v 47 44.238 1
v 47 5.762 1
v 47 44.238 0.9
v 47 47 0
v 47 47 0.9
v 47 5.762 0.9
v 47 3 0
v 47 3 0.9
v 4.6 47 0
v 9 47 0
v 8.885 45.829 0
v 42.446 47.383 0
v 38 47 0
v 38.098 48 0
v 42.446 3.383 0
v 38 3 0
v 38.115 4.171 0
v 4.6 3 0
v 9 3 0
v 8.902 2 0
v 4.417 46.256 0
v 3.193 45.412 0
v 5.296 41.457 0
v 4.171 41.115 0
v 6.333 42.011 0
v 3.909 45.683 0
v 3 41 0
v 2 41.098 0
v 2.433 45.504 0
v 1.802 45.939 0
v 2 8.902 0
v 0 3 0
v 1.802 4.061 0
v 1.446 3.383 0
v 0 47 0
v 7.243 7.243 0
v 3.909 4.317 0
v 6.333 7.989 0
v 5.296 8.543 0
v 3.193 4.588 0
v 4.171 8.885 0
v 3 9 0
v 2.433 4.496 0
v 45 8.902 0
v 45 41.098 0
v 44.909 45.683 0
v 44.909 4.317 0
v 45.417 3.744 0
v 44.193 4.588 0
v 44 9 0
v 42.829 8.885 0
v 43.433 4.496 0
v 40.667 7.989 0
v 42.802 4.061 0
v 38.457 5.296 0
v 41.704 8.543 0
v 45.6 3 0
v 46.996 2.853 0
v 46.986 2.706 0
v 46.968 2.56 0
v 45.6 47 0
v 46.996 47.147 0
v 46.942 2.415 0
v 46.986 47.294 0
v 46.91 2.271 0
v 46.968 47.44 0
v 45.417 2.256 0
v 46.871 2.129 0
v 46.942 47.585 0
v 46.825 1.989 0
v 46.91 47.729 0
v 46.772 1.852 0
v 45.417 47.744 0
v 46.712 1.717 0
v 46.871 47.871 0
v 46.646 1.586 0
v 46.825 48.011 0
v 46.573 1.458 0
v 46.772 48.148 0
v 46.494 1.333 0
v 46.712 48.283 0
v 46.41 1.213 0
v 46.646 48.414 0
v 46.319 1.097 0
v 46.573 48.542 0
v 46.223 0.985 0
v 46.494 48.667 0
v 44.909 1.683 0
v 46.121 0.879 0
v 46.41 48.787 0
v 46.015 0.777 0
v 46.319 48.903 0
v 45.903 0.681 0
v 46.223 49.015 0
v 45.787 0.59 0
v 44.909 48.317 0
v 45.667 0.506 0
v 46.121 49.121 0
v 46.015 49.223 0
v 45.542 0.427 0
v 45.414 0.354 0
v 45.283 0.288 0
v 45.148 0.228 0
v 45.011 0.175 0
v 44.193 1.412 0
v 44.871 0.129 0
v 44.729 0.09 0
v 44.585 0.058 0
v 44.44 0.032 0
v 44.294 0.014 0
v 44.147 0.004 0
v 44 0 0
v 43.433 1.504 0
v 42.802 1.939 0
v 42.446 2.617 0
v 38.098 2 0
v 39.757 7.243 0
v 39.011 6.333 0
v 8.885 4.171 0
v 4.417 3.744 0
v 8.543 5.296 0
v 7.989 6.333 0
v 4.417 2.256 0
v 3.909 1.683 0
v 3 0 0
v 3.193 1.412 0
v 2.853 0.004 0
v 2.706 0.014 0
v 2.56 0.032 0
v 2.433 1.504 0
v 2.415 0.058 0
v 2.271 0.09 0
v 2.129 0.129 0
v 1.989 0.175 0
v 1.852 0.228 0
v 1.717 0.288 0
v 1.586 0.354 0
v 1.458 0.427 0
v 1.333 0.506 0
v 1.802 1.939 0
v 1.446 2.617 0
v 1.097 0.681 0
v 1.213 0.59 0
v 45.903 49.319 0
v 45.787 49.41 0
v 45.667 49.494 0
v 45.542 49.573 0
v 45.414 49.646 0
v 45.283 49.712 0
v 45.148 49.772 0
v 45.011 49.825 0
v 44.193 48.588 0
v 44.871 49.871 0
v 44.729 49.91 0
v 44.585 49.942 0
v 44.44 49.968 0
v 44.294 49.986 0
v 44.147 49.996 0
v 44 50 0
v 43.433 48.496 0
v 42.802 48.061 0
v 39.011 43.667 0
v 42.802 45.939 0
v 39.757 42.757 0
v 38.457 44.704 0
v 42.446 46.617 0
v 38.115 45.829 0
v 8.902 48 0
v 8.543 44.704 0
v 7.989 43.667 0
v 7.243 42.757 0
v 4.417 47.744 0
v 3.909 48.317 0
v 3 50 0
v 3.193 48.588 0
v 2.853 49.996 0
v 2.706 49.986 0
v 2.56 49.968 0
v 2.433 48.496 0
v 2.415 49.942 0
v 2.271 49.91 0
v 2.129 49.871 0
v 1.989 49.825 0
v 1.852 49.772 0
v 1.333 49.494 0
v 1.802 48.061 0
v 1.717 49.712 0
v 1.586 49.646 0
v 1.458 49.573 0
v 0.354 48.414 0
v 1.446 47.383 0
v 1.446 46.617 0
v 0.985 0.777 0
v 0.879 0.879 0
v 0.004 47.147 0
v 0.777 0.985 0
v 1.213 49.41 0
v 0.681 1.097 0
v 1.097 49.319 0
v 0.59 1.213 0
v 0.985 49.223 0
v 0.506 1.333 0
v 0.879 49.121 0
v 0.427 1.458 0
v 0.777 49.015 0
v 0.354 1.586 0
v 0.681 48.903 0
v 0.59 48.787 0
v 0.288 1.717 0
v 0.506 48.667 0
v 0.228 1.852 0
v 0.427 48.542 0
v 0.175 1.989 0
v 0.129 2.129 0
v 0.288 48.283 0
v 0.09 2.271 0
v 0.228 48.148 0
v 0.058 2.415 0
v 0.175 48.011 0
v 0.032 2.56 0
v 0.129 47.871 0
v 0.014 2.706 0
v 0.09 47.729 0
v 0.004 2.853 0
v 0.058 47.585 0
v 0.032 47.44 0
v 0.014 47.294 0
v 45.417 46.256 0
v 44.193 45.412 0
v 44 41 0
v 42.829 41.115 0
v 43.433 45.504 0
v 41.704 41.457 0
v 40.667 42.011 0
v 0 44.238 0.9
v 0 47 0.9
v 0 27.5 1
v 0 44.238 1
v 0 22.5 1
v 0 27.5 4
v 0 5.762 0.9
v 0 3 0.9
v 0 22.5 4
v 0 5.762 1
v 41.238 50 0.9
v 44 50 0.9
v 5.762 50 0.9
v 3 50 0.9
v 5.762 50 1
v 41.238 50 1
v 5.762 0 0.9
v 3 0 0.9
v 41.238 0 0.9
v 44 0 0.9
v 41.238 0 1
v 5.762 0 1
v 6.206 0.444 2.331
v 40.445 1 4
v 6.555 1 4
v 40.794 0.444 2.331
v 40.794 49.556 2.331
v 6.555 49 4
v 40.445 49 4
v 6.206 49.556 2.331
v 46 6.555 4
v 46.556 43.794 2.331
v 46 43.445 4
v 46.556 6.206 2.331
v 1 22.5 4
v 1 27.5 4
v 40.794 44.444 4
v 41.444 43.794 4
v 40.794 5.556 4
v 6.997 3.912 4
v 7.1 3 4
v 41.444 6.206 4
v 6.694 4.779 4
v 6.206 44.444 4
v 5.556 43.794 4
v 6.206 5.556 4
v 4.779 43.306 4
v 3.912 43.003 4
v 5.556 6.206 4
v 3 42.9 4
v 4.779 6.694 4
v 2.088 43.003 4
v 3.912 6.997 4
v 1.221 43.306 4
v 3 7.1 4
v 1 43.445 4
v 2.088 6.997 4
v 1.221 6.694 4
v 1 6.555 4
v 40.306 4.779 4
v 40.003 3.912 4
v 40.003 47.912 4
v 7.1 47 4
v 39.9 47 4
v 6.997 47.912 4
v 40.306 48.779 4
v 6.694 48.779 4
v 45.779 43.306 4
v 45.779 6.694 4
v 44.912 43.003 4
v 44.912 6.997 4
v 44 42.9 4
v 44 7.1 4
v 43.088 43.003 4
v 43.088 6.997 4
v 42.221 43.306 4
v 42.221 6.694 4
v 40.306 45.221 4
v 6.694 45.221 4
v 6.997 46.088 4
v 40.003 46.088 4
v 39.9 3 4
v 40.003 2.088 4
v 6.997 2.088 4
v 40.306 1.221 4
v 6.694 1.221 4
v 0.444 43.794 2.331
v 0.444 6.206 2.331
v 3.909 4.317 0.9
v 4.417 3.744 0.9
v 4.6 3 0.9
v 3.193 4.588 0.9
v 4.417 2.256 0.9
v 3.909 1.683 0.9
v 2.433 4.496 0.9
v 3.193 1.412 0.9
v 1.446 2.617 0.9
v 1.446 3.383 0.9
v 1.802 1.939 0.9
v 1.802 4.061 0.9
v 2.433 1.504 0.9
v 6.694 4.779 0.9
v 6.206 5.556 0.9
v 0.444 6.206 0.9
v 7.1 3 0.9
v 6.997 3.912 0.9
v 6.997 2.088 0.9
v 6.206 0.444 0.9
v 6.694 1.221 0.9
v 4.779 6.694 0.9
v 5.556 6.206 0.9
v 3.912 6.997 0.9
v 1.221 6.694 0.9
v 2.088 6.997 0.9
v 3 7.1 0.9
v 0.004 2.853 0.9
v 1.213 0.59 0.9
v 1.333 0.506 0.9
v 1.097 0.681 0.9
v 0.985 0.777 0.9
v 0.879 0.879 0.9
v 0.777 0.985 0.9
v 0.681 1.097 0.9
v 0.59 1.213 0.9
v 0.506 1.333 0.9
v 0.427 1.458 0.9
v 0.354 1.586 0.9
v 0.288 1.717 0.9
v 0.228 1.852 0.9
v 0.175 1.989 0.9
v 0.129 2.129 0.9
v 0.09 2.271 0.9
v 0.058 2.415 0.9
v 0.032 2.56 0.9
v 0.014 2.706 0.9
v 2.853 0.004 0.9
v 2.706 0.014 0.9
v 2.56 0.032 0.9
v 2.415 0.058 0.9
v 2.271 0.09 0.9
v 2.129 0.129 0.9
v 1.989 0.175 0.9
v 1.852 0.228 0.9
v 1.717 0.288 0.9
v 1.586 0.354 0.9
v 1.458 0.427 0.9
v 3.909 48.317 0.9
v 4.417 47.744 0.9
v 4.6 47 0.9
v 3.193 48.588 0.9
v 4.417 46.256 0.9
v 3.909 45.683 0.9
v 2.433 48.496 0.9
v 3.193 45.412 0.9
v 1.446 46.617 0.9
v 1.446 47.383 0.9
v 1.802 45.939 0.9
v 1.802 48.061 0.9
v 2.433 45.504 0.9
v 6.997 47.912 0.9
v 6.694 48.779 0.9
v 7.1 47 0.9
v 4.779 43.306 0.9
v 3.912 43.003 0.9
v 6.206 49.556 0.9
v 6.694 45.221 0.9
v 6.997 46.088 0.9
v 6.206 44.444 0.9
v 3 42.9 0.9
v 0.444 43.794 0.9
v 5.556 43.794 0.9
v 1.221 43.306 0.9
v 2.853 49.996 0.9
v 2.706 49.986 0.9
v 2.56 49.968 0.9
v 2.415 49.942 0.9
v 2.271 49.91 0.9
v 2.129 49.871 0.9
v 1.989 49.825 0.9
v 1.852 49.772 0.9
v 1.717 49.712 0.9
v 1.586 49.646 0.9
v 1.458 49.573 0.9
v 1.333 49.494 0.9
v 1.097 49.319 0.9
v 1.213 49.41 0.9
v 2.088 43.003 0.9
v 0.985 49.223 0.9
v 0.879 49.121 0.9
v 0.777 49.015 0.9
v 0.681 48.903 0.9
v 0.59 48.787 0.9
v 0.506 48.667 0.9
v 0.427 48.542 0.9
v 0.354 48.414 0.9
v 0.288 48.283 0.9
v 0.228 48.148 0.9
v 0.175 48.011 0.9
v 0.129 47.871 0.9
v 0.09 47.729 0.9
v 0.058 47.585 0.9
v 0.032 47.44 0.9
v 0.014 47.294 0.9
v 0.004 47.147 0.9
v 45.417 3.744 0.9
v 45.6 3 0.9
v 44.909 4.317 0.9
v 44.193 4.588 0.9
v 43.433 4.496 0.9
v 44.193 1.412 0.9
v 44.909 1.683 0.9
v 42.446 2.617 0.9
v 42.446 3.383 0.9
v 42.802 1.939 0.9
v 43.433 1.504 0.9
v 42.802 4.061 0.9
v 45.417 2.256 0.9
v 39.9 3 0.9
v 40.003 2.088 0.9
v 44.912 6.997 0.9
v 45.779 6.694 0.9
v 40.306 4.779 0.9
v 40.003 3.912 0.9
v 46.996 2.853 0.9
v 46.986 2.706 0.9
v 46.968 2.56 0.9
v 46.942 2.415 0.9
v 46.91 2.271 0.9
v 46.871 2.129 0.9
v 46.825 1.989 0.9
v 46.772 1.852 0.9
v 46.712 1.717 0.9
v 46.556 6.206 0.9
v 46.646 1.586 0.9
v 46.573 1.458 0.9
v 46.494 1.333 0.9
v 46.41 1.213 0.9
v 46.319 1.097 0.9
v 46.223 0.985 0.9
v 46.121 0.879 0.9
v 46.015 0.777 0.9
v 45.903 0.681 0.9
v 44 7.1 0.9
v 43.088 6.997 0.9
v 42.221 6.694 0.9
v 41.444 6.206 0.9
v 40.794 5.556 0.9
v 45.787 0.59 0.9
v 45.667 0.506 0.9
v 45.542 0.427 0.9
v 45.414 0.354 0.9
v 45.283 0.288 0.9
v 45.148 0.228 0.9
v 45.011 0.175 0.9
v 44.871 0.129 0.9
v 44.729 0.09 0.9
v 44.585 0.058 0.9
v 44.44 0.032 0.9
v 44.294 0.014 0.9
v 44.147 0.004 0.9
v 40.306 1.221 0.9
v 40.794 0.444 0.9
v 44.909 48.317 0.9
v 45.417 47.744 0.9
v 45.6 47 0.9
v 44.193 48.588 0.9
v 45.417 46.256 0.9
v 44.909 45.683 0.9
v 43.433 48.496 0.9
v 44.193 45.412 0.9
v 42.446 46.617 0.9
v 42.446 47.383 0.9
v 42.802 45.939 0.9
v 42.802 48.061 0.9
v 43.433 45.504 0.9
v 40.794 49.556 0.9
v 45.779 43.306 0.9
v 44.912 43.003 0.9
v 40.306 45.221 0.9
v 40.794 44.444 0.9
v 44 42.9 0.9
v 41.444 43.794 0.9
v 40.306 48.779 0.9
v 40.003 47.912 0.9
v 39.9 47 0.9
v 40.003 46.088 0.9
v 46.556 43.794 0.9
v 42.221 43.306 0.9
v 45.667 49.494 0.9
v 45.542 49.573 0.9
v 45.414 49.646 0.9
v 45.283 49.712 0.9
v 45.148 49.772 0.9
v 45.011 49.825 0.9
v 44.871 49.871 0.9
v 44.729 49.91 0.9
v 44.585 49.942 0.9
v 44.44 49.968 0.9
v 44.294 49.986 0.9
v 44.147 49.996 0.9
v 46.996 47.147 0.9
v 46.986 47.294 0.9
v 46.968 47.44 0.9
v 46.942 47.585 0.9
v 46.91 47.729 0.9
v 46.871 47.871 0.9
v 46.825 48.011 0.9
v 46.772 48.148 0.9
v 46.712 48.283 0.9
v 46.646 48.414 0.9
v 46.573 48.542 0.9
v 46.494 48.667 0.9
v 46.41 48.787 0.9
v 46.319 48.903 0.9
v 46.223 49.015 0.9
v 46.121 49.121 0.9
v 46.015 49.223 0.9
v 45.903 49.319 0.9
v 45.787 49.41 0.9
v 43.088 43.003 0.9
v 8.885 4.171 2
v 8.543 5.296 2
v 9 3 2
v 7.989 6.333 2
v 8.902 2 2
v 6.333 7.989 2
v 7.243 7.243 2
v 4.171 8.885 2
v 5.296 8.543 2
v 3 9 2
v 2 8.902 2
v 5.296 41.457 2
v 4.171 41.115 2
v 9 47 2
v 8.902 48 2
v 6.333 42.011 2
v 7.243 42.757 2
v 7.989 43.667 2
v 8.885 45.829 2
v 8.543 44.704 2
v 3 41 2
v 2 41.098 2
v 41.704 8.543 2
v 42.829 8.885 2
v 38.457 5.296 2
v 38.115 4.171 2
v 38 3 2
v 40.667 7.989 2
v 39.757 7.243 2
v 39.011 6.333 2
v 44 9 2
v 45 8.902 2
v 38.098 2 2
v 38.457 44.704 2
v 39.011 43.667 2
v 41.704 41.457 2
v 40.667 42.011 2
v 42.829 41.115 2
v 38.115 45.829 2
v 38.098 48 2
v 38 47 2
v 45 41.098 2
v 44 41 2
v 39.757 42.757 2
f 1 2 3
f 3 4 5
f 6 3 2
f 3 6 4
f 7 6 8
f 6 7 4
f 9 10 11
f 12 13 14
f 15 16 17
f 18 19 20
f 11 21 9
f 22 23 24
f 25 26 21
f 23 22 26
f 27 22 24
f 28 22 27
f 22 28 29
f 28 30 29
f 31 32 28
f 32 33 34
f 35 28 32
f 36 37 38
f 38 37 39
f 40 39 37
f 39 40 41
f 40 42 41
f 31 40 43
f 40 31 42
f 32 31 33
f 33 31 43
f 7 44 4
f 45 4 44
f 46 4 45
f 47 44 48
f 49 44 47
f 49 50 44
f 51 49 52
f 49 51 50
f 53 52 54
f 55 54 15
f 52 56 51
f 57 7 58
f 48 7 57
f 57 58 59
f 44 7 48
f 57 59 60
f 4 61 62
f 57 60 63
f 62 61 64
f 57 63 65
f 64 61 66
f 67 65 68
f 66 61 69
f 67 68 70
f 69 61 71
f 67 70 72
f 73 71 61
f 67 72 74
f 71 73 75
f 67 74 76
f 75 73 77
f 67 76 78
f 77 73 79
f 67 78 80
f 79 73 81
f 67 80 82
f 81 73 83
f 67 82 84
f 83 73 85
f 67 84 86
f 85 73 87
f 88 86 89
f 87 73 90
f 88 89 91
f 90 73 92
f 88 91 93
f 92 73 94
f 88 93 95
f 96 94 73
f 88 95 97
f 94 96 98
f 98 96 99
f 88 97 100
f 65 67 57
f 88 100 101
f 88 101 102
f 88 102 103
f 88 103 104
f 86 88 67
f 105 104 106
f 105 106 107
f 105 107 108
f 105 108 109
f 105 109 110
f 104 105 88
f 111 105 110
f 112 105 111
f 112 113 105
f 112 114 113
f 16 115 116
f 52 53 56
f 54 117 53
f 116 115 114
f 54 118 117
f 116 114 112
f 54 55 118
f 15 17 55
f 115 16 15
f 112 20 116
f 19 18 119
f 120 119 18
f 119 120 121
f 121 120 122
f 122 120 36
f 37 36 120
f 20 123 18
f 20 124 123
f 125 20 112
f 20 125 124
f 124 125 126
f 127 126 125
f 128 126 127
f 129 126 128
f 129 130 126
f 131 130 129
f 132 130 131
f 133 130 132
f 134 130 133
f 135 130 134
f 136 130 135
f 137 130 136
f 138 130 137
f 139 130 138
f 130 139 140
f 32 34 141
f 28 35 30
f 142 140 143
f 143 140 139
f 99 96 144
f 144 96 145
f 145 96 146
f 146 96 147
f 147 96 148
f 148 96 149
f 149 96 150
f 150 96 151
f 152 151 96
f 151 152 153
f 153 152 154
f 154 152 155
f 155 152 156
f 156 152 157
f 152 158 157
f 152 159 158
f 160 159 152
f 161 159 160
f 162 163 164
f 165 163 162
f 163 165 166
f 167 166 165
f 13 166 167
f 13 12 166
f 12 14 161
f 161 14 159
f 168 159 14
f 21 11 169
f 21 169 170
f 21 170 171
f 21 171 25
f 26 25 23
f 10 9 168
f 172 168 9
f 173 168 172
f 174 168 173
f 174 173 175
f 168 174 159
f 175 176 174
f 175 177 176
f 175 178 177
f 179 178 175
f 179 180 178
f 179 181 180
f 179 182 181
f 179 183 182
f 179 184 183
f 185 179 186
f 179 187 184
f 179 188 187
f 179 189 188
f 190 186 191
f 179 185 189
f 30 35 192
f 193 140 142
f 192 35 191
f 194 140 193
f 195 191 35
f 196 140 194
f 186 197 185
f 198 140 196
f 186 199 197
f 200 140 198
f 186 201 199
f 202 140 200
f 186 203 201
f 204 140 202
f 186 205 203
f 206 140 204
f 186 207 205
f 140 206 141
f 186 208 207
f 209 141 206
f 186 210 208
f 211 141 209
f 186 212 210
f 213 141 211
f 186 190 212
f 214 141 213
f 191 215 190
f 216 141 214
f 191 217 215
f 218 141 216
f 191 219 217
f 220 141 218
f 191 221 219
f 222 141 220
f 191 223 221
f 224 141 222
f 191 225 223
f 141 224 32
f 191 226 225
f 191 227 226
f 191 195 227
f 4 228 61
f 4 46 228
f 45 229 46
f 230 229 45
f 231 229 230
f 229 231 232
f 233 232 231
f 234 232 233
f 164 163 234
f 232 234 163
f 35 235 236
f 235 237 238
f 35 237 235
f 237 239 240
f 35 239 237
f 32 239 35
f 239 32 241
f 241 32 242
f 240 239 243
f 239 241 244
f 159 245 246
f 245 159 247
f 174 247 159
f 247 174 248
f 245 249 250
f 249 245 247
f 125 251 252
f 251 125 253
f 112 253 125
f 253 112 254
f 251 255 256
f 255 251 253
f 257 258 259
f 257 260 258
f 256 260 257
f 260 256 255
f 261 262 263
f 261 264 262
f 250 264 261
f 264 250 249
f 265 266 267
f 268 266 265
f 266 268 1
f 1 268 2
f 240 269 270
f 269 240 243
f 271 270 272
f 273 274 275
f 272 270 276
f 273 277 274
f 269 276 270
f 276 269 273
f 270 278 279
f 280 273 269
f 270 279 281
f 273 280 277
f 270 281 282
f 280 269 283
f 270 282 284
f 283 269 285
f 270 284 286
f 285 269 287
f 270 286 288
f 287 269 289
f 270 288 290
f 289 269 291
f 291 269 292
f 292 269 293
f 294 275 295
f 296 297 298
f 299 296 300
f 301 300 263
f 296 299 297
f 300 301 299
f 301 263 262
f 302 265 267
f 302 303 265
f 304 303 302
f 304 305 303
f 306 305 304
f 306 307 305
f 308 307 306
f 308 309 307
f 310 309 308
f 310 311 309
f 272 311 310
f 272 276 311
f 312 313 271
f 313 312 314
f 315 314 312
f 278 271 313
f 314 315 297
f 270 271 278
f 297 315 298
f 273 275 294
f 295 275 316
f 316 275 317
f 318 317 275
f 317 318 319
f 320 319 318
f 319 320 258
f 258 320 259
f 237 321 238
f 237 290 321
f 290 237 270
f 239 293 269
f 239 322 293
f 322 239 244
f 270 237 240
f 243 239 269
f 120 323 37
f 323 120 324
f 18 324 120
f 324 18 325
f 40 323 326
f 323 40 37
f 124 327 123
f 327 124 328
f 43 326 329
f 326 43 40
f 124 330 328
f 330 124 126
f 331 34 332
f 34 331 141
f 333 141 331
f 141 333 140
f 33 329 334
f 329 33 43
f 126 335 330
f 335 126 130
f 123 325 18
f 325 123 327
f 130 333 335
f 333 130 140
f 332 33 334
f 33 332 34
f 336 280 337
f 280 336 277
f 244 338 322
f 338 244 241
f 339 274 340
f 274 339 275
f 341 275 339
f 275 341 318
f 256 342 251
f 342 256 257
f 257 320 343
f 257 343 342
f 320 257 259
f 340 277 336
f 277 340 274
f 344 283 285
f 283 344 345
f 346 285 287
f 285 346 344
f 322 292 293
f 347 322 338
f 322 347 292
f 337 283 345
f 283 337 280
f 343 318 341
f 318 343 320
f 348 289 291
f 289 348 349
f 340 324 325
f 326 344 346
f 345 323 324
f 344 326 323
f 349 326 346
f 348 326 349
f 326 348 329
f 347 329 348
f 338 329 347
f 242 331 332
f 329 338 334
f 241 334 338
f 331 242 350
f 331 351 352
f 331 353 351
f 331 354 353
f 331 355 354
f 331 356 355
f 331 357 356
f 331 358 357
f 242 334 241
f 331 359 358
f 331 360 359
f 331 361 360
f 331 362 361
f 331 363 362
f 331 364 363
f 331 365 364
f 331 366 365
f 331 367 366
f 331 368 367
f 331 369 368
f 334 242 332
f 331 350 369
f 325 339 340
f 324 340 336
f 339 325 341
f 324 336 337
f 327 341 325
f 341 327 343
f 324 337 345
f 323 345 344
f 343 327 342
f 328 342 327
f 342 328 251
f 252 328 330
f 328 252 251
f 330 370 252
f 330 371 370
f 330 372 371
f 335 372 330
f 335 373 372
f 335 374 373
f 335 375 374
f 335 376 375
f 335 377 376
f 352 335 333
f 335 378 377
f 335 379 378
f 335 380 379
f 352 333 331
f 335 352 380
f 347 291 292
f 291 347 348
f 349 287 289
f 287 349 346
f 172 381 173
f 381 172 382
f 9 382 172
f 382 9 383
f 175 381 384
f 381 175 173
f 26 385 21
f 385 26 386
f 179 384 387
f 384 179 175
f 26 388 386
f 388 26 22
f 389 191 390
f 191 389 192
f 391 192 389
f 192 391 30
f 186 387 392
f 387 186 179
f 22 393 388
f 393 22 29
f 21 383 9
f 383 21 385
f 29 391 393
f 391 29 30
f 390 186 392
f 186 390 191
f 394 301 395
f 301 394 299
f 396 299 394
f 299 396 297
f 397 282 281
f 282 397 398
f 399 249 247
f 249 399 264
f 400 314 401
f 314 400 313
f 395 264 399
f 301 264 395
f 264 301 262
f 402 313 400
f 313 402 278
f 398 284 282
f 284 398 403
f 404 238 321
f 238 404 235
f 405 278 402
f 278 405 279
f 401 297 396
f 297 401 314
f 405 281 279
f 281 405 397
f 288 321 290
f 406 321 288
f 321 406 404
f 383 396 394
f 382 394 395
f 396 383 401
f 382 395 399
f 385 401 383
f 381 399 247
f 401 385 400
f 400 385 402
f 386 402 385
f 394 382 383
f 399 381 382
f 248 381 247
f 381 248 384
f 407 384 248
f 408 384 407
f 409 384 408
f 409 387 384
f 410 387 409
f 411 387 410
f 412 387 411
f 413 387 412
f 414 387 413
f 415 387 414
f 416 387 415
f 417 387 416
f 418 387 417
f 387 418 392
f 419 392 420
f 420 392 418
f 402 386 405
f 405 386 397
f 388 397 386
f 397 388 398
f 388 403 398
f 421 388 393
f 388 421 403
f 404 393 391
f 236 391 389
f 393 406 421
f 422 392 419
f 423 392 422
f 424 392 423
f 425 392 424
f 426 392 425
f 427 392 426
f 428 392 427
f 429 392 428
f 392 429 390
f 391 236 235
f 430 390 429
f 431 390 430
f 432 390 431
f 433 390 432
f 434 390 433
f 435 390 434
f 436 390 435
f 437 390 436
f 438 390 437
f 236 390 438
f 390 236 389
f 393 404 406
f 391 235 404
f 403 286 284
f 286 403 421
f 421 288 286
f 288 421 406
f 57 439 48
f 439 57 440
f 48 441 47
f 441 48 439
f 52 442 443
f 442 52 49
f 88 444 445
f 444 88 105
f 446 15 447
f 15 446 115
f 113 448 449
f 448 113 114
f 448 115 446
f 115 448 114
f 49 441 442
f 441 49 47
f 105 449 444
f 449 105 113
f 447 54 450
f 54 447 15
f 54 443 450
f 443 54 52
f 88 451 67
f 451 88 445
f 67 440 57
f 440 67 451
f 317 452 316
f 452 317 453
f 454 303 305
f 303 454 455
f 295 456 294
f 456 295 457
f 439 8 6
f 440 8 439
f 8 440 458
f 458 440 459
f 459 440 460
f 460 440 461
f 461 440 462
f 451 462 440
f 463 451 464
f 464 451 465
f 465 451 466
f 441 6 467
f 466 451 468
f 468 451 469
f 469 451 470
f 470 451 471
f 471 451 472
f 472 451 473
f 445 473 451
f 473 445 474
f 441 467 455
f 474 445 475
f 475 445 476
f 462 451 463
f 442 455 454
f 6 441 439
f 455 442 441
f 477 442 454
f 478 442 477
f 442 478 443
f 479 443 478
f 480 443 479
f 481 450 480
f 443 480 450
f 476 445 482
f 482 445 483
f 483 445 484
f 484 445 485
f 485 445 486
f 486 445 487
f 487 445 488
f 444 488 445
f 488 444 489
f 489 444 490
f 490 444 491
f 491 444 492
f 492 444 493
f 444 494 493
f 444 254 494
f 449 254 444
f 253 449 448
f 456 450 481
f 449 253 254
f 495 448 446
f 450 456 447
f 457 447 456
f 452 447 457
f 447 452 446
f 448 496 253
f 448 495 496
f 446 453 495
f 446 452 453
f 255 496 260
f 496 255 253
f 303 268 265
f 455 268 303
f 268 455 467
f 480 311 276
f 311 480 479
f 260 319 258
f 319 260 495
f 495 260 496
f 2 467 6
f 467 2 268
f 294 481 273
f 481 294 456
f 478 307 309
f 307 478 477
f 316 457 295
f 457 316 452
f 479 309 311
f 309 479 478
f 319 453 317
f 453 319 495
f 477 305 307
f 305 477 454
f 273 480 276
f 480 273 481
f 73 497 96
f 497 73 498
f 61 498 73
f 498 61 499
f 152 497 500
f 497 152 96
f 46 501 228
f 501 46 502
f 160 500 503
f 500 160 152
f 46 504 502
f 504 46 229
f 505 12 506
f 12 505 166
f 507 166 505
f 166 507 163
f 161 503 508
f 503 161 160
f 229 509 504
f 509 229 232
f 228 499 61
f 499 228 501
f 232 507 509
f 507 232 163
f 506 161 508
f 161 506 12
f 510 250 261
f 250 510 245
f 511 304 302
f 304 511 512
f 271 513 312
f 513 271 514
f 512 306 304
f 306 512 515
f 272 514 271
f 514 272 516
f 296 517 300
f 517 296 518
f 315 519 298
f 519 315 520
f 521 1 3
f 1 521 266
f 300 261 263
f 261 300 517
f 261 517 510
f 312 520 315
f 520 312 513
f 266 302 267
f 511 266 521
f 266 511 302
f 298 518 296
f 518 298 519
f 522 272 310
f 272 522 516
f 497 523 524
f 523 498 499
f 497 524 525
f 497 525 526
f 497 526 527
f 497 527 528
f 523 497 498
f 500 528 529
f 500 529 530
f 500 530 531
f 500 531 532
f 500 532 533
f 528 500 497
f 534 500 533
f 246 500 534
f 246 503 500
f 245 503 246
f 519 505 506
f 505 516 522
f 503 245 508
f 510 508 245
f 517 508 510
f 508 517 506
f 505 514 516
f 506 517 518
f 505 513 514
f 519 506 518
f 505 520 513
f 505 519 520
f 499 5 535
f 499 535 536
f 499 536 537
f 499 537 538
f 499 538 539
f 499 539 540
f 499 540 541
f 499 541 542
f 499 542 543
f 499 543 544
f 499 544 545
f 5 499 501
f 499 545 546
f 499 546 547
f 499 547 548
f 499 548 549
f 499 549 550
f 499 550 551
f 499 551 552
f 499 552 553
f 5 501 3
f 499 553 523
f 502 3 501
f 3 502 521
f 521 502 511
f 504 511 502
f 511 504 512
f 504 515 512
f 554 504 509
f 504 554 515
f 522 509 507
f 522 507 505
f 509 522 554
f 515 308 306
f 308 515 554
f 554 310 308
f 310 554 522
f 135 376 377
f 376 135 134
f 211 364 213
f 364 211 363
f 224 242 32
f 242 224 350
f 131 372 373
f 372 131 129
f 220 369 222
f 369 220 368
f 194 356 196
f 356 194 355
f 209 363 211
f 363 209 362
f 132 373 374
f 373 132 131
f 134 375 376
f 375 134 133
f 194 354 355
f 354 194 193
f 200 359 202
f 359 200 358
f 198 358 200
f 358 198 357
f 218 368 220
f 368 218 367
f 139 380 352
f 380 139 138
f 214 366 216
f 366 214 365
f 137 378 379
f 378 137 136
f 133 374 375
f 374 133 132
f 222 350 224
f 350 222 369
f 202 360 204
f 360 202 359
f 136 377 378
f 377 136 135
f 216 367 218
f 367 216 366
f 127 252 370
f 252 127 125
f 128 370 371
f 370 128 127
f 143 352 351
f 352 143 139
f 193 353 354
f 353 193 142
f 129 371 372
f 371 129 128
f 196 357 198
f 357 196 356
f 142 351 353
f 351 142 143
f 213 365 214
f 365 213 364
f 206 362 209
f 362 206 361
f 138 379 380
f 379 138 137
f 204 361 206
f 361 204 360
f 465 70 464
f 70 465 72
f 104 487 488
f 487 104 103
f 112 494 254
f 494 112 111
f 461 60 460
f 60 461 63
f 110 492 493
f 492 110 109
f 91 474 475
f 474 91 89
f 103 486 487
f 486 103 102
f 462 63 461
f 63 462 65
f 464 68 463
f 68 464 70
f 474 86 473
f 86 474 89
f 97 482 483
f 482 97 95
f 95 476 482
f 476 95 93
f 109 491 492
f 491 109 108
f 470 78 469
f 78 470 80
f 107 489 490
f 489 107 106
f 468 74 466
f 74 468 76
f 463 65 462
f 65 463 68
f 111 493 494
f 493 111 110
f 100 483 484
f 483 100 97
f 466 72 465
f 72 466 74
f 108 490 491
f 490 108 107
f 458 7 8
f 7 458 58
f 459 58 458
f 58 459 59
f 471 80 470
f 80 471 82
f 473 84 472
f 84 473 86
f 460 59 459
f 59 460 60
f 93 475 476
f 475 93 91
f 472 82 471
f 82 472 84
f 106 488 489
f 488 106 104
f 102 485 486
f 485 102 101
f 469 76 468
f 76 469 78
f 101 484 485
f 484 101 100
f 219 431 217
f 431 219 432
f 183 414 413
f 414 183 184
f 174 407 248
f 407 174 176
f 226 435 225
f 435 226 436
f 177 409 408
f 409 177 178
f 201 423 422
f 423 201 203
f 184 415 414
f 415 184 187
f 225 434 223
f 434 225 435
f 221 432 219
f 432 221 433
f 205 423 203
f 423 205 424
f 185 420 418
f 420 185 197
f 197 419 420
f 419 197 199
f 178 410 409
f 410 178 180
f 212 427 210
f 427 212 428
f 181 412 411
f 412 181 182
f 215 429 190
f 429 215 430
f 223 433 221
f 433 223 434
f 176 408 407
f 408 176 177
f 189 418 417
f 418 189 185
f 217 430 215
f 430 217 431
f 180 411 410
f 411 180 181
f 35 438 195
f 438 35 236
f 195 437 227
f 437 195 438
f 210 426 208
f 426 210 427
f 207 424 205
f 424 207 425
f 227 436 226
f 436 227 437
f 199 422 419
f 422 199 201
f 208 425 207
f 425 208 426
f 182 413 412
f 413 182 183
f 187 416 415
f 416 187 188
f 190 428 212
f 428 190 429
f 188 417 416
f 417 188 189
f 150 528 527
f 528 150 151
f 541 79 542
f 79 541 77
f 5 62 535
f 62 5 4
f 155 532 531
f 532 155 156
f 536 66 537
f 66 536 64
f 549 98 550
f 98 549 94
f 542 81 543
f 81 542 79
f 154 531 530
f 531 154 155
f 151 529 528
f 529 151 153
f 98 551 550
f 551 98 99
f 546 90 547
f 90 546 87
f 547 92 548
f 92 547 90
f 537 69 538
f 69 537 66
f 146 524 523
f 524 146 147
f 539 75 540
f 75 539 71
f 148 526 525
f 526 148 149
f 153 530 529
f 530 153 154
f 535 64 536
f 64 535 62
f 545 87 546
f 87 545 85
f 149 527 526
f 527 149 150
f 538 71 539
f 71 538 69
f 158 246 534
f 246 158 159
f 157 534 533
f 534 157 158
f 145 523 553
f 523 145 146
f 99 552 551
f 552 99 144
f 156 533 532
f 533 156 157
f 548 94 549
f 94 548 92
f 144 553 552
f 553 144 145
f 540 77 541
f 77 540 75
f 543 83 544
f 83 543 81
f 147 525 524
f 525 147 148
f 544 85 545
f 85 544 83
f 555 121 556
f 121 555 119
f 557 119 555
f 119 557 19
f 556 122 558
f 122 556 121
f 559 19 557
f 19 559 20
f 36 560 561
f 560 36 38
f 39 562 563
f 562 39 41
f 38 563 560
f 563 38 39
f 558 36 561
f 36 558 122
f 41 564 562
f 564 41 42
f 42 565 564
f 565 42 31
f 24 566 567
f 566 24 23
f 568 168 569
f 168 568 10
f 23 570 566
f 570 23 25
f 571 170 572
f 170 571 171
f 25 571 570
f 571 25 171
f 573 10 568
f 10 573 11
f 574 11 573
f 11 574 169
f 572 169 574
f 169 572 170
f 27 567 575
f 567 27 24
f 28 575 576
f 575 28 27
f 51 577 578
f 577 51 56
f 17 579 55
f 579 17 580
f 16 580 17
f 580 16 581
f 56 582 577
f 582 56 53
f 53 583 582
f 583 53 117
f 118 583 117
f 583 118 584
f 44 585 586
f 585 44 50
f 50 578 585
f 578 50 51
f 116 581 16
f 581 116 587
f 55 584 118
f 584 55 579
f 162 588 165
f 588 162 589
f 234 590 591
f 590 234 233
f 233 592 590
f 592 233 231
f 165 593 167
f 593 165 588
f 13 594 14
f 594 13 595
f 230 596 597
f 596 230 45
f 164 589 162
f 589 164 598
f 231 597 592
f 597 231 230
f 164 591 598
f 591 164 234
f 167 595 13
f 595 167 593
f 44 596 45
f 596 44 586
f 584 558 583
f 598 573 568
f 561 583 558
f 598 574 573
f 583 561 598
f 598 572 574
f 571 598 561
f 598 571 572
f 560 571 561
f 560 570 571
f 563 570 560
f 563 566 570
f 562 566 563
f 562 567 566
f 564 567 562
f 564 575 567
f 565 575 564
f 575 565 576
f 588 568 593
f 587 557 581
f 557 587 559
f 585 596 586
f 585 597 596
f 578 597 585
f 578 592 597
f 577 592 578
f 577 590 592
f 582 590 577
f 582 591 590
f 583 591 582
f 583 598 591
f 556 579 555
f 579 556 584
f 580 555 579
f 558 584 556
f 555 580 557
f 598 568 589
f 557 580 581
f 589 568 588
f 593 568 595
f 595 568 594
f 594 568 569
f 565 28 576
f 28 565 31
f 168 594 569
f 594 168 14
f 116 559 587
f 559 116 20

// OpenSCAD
// file: lib/utils.scad
module clearance_hole(d, h=100, clearance=0.2, e=0.1) {
	cylinder(r=(d+clearance)/2, h=h+e, $fn=min(64, 4 + 3*d));
}

module z_fillet(r=5, h=100, e=0.1) {
	difference() {
	translate([0-e, 0-e, 0])
		cube([r+e, r+e, h]);
	translate([r, r, 0-e])
		cylinder(r=r, h=h+e+e, $fn=$fn*4);
	}
}

module hexagonal_prism(d_flat=8, h=10) {
    r = d_flat / sqrt(3); // Circumradius
    cylinder(h=h, r=r, $fn=6);
}

module grip_texture(length, depth, height) {
	n = floor(length/depth); // TODO: number of teeth
	e = 0.1;
	xOffset = (length - depth*n)/2;
	difference() {
		translate([0, 0-e, 0-e])
		cube([length, depth+e, height+e+e]);
		for (i = [0:n]) {
			translate([i*depth*2 - xOffset, depth, 0-e])
			cylinder(r=depth, h=height+e+e, $fn=4);
		}
	}
}

module lanyard_loop(length=30, width=8, height=10, overflow=0, slotDiameter=5) {
	e=0.1;
	wall = (height - slotDiameter)/2;
	assert(wall > 0, "slotDiameter too large for lanyard loop");
	difference() {
		union() {
			translate([0-overflow, 0, 0])
			cube([height+overflow, length, width]);
			translate([0, length, 0])
				z_fillet(height/2, h=width);
		}
		translate([height, 0, 0-e])
		rotate([0, 0, 90])
		z_fillet(height/2);
		translate([height, length, 0-e])
		rotate([0, 0, 180])
		z_fillet(height/2);

		// slot
		slotLength = length - wall*3 - slotDiameter;
		translate([wall, wall, 0-e])
			round_rect(size=[slotDiameter, slotLength, width+e+e], r=slotDiameter/2);
		translate([height/2, length - slotDiameter/2 - wall, 0-e])
		cylinder(r=slotDiameter/2, h=width+e+e);
	}
}

module round_rect(size=[10, 10, 10], r=1) {
	difference() {
		cube(size);
		if (r > 0) {
			for (i = [[0,0,0], [1,0,90], [1,1,180], [0,1,270]]) {
				translate([i[0]*size[0], i[1]*size[1], -.1])
				rotate([0, 0, i[2]])
					z_fillet(r, h=size[2]+0.2);
			}
		}
	}
}

function mounting_bolts(length, width, holeOffset) = [
	[ holeOffset, holeOffset],
	[ holeOffset, width - holeOffset],
	[ length - holeOffset, holeOffset],
	[ length - holeOffset, width - holeOffset]
];
// main file
use <lib/utils.scad>;

module case_cover(
	length=47,
	width=50,
	thickness=4,
	hex=false,
	counterboreDepth=3,
	counterboreDiameter=8) {

	bottomThickness = 1;
	topThickness = 2;
	mountHoleOffset = 3; // must match the value in case_frame
	mountHoleSize = 3;
	draftOffset = 1;
	wallThickness = 2;
	e = 0.1; // small waste number; not for final geometry

	assert(thickness >= (counterboreDepth+bottomThickness), "case_cover thickness is too small");

	difference() {
		union() {
			cube([
				length,
				width,
				bottomThickness
			]);
			translate([0, 0, bottomThickness])
				truncated_pyramid(length=length, width=width, height=thickness-bottomThickness, inset=draftOffset);

			// Feet - for stability
			footWidth = 5;
			translate([0, (width - footWidth)/2, 0])
				cube([ length/2, footWidth, thickness]);

		}

		for (position = mounting_bolts(length, width, mountHoleOffset)) {
			translate([position[0], position[1], 0-e]) {
				clearance_hole(mountHoleSize);
				translate([0,0, thickness - counterboreDepth])
				if (hex) {
					cylinder(r=counterboreDiameter/2 * (sqrt(3)/2), h=counterboreDepth+e+e, $fn=6);
				} else {
					clearance_hole(counterboreDiameter, counterboreDepth+e);
				}
			}
		}
		// Corner Radiuses
		translate([0, 0, 0-e])          rotate([0, 0, 0])    z_fillet(3);
		translate([length, 0, 0-e])     rotate([0, 0, 90])   z_fillet(3);
		translate([0, width, 0-e])      rotate([0, 0, 270])  z_fillet(3);
		translate([length, width, 0-e]) rotate([0, 0, 180])  z_fillet(3);

		// Inner cavity
		difference() {
			translate([
				wallThickness,
				wallThickness,
				0-e
			])
			cube([
				length - 2*wallThickness,
				width - 2*wallThickness,
				thickness - topThickness + e
			]);

			for (position = mounting_bolts(length, width, mountHoleOffset)) {
				translate([position[0], position[1], 0-e]) {
					innerCavityRadius = max((counterboreDiameter/2)+topThickness,wallThickness);
					cylinder(r=innerCavityRadius, h=thickness-topThickness+e+e);
				}
			}
		}
	}

}

module truncated_pyramid(length, width, height, inset=5) {
	polyhedron(
		points=[
			[0      , 0     , 0]      , // 0
			[length , 0     , 0]      , // 1
			[length , width , 0]      , // 2
			[0      , width , 0]      , // 3

			[inset        , inset       , height] , // 4
			[length-inset , inset       , height] , // 5
			[length-inset , width-inset , height] , // 6
			[inset        , width-inset , height] , // 7
		],
		faces=[
			[1, 0, 4],
			[4, 5, 1],
			[2, 1, 5],
			[5, 6, 2],
			[3, 2, 6],
			[6, 7, 3],
			[0, 3, 7],
			[7, 4, 0],
			[7, 6, 5],
			[4, 7, 5],
			[0, 1, 3],
			[1, 2, 3],
		],
		convexity=1
	);
}

case_cover($fn=32);
